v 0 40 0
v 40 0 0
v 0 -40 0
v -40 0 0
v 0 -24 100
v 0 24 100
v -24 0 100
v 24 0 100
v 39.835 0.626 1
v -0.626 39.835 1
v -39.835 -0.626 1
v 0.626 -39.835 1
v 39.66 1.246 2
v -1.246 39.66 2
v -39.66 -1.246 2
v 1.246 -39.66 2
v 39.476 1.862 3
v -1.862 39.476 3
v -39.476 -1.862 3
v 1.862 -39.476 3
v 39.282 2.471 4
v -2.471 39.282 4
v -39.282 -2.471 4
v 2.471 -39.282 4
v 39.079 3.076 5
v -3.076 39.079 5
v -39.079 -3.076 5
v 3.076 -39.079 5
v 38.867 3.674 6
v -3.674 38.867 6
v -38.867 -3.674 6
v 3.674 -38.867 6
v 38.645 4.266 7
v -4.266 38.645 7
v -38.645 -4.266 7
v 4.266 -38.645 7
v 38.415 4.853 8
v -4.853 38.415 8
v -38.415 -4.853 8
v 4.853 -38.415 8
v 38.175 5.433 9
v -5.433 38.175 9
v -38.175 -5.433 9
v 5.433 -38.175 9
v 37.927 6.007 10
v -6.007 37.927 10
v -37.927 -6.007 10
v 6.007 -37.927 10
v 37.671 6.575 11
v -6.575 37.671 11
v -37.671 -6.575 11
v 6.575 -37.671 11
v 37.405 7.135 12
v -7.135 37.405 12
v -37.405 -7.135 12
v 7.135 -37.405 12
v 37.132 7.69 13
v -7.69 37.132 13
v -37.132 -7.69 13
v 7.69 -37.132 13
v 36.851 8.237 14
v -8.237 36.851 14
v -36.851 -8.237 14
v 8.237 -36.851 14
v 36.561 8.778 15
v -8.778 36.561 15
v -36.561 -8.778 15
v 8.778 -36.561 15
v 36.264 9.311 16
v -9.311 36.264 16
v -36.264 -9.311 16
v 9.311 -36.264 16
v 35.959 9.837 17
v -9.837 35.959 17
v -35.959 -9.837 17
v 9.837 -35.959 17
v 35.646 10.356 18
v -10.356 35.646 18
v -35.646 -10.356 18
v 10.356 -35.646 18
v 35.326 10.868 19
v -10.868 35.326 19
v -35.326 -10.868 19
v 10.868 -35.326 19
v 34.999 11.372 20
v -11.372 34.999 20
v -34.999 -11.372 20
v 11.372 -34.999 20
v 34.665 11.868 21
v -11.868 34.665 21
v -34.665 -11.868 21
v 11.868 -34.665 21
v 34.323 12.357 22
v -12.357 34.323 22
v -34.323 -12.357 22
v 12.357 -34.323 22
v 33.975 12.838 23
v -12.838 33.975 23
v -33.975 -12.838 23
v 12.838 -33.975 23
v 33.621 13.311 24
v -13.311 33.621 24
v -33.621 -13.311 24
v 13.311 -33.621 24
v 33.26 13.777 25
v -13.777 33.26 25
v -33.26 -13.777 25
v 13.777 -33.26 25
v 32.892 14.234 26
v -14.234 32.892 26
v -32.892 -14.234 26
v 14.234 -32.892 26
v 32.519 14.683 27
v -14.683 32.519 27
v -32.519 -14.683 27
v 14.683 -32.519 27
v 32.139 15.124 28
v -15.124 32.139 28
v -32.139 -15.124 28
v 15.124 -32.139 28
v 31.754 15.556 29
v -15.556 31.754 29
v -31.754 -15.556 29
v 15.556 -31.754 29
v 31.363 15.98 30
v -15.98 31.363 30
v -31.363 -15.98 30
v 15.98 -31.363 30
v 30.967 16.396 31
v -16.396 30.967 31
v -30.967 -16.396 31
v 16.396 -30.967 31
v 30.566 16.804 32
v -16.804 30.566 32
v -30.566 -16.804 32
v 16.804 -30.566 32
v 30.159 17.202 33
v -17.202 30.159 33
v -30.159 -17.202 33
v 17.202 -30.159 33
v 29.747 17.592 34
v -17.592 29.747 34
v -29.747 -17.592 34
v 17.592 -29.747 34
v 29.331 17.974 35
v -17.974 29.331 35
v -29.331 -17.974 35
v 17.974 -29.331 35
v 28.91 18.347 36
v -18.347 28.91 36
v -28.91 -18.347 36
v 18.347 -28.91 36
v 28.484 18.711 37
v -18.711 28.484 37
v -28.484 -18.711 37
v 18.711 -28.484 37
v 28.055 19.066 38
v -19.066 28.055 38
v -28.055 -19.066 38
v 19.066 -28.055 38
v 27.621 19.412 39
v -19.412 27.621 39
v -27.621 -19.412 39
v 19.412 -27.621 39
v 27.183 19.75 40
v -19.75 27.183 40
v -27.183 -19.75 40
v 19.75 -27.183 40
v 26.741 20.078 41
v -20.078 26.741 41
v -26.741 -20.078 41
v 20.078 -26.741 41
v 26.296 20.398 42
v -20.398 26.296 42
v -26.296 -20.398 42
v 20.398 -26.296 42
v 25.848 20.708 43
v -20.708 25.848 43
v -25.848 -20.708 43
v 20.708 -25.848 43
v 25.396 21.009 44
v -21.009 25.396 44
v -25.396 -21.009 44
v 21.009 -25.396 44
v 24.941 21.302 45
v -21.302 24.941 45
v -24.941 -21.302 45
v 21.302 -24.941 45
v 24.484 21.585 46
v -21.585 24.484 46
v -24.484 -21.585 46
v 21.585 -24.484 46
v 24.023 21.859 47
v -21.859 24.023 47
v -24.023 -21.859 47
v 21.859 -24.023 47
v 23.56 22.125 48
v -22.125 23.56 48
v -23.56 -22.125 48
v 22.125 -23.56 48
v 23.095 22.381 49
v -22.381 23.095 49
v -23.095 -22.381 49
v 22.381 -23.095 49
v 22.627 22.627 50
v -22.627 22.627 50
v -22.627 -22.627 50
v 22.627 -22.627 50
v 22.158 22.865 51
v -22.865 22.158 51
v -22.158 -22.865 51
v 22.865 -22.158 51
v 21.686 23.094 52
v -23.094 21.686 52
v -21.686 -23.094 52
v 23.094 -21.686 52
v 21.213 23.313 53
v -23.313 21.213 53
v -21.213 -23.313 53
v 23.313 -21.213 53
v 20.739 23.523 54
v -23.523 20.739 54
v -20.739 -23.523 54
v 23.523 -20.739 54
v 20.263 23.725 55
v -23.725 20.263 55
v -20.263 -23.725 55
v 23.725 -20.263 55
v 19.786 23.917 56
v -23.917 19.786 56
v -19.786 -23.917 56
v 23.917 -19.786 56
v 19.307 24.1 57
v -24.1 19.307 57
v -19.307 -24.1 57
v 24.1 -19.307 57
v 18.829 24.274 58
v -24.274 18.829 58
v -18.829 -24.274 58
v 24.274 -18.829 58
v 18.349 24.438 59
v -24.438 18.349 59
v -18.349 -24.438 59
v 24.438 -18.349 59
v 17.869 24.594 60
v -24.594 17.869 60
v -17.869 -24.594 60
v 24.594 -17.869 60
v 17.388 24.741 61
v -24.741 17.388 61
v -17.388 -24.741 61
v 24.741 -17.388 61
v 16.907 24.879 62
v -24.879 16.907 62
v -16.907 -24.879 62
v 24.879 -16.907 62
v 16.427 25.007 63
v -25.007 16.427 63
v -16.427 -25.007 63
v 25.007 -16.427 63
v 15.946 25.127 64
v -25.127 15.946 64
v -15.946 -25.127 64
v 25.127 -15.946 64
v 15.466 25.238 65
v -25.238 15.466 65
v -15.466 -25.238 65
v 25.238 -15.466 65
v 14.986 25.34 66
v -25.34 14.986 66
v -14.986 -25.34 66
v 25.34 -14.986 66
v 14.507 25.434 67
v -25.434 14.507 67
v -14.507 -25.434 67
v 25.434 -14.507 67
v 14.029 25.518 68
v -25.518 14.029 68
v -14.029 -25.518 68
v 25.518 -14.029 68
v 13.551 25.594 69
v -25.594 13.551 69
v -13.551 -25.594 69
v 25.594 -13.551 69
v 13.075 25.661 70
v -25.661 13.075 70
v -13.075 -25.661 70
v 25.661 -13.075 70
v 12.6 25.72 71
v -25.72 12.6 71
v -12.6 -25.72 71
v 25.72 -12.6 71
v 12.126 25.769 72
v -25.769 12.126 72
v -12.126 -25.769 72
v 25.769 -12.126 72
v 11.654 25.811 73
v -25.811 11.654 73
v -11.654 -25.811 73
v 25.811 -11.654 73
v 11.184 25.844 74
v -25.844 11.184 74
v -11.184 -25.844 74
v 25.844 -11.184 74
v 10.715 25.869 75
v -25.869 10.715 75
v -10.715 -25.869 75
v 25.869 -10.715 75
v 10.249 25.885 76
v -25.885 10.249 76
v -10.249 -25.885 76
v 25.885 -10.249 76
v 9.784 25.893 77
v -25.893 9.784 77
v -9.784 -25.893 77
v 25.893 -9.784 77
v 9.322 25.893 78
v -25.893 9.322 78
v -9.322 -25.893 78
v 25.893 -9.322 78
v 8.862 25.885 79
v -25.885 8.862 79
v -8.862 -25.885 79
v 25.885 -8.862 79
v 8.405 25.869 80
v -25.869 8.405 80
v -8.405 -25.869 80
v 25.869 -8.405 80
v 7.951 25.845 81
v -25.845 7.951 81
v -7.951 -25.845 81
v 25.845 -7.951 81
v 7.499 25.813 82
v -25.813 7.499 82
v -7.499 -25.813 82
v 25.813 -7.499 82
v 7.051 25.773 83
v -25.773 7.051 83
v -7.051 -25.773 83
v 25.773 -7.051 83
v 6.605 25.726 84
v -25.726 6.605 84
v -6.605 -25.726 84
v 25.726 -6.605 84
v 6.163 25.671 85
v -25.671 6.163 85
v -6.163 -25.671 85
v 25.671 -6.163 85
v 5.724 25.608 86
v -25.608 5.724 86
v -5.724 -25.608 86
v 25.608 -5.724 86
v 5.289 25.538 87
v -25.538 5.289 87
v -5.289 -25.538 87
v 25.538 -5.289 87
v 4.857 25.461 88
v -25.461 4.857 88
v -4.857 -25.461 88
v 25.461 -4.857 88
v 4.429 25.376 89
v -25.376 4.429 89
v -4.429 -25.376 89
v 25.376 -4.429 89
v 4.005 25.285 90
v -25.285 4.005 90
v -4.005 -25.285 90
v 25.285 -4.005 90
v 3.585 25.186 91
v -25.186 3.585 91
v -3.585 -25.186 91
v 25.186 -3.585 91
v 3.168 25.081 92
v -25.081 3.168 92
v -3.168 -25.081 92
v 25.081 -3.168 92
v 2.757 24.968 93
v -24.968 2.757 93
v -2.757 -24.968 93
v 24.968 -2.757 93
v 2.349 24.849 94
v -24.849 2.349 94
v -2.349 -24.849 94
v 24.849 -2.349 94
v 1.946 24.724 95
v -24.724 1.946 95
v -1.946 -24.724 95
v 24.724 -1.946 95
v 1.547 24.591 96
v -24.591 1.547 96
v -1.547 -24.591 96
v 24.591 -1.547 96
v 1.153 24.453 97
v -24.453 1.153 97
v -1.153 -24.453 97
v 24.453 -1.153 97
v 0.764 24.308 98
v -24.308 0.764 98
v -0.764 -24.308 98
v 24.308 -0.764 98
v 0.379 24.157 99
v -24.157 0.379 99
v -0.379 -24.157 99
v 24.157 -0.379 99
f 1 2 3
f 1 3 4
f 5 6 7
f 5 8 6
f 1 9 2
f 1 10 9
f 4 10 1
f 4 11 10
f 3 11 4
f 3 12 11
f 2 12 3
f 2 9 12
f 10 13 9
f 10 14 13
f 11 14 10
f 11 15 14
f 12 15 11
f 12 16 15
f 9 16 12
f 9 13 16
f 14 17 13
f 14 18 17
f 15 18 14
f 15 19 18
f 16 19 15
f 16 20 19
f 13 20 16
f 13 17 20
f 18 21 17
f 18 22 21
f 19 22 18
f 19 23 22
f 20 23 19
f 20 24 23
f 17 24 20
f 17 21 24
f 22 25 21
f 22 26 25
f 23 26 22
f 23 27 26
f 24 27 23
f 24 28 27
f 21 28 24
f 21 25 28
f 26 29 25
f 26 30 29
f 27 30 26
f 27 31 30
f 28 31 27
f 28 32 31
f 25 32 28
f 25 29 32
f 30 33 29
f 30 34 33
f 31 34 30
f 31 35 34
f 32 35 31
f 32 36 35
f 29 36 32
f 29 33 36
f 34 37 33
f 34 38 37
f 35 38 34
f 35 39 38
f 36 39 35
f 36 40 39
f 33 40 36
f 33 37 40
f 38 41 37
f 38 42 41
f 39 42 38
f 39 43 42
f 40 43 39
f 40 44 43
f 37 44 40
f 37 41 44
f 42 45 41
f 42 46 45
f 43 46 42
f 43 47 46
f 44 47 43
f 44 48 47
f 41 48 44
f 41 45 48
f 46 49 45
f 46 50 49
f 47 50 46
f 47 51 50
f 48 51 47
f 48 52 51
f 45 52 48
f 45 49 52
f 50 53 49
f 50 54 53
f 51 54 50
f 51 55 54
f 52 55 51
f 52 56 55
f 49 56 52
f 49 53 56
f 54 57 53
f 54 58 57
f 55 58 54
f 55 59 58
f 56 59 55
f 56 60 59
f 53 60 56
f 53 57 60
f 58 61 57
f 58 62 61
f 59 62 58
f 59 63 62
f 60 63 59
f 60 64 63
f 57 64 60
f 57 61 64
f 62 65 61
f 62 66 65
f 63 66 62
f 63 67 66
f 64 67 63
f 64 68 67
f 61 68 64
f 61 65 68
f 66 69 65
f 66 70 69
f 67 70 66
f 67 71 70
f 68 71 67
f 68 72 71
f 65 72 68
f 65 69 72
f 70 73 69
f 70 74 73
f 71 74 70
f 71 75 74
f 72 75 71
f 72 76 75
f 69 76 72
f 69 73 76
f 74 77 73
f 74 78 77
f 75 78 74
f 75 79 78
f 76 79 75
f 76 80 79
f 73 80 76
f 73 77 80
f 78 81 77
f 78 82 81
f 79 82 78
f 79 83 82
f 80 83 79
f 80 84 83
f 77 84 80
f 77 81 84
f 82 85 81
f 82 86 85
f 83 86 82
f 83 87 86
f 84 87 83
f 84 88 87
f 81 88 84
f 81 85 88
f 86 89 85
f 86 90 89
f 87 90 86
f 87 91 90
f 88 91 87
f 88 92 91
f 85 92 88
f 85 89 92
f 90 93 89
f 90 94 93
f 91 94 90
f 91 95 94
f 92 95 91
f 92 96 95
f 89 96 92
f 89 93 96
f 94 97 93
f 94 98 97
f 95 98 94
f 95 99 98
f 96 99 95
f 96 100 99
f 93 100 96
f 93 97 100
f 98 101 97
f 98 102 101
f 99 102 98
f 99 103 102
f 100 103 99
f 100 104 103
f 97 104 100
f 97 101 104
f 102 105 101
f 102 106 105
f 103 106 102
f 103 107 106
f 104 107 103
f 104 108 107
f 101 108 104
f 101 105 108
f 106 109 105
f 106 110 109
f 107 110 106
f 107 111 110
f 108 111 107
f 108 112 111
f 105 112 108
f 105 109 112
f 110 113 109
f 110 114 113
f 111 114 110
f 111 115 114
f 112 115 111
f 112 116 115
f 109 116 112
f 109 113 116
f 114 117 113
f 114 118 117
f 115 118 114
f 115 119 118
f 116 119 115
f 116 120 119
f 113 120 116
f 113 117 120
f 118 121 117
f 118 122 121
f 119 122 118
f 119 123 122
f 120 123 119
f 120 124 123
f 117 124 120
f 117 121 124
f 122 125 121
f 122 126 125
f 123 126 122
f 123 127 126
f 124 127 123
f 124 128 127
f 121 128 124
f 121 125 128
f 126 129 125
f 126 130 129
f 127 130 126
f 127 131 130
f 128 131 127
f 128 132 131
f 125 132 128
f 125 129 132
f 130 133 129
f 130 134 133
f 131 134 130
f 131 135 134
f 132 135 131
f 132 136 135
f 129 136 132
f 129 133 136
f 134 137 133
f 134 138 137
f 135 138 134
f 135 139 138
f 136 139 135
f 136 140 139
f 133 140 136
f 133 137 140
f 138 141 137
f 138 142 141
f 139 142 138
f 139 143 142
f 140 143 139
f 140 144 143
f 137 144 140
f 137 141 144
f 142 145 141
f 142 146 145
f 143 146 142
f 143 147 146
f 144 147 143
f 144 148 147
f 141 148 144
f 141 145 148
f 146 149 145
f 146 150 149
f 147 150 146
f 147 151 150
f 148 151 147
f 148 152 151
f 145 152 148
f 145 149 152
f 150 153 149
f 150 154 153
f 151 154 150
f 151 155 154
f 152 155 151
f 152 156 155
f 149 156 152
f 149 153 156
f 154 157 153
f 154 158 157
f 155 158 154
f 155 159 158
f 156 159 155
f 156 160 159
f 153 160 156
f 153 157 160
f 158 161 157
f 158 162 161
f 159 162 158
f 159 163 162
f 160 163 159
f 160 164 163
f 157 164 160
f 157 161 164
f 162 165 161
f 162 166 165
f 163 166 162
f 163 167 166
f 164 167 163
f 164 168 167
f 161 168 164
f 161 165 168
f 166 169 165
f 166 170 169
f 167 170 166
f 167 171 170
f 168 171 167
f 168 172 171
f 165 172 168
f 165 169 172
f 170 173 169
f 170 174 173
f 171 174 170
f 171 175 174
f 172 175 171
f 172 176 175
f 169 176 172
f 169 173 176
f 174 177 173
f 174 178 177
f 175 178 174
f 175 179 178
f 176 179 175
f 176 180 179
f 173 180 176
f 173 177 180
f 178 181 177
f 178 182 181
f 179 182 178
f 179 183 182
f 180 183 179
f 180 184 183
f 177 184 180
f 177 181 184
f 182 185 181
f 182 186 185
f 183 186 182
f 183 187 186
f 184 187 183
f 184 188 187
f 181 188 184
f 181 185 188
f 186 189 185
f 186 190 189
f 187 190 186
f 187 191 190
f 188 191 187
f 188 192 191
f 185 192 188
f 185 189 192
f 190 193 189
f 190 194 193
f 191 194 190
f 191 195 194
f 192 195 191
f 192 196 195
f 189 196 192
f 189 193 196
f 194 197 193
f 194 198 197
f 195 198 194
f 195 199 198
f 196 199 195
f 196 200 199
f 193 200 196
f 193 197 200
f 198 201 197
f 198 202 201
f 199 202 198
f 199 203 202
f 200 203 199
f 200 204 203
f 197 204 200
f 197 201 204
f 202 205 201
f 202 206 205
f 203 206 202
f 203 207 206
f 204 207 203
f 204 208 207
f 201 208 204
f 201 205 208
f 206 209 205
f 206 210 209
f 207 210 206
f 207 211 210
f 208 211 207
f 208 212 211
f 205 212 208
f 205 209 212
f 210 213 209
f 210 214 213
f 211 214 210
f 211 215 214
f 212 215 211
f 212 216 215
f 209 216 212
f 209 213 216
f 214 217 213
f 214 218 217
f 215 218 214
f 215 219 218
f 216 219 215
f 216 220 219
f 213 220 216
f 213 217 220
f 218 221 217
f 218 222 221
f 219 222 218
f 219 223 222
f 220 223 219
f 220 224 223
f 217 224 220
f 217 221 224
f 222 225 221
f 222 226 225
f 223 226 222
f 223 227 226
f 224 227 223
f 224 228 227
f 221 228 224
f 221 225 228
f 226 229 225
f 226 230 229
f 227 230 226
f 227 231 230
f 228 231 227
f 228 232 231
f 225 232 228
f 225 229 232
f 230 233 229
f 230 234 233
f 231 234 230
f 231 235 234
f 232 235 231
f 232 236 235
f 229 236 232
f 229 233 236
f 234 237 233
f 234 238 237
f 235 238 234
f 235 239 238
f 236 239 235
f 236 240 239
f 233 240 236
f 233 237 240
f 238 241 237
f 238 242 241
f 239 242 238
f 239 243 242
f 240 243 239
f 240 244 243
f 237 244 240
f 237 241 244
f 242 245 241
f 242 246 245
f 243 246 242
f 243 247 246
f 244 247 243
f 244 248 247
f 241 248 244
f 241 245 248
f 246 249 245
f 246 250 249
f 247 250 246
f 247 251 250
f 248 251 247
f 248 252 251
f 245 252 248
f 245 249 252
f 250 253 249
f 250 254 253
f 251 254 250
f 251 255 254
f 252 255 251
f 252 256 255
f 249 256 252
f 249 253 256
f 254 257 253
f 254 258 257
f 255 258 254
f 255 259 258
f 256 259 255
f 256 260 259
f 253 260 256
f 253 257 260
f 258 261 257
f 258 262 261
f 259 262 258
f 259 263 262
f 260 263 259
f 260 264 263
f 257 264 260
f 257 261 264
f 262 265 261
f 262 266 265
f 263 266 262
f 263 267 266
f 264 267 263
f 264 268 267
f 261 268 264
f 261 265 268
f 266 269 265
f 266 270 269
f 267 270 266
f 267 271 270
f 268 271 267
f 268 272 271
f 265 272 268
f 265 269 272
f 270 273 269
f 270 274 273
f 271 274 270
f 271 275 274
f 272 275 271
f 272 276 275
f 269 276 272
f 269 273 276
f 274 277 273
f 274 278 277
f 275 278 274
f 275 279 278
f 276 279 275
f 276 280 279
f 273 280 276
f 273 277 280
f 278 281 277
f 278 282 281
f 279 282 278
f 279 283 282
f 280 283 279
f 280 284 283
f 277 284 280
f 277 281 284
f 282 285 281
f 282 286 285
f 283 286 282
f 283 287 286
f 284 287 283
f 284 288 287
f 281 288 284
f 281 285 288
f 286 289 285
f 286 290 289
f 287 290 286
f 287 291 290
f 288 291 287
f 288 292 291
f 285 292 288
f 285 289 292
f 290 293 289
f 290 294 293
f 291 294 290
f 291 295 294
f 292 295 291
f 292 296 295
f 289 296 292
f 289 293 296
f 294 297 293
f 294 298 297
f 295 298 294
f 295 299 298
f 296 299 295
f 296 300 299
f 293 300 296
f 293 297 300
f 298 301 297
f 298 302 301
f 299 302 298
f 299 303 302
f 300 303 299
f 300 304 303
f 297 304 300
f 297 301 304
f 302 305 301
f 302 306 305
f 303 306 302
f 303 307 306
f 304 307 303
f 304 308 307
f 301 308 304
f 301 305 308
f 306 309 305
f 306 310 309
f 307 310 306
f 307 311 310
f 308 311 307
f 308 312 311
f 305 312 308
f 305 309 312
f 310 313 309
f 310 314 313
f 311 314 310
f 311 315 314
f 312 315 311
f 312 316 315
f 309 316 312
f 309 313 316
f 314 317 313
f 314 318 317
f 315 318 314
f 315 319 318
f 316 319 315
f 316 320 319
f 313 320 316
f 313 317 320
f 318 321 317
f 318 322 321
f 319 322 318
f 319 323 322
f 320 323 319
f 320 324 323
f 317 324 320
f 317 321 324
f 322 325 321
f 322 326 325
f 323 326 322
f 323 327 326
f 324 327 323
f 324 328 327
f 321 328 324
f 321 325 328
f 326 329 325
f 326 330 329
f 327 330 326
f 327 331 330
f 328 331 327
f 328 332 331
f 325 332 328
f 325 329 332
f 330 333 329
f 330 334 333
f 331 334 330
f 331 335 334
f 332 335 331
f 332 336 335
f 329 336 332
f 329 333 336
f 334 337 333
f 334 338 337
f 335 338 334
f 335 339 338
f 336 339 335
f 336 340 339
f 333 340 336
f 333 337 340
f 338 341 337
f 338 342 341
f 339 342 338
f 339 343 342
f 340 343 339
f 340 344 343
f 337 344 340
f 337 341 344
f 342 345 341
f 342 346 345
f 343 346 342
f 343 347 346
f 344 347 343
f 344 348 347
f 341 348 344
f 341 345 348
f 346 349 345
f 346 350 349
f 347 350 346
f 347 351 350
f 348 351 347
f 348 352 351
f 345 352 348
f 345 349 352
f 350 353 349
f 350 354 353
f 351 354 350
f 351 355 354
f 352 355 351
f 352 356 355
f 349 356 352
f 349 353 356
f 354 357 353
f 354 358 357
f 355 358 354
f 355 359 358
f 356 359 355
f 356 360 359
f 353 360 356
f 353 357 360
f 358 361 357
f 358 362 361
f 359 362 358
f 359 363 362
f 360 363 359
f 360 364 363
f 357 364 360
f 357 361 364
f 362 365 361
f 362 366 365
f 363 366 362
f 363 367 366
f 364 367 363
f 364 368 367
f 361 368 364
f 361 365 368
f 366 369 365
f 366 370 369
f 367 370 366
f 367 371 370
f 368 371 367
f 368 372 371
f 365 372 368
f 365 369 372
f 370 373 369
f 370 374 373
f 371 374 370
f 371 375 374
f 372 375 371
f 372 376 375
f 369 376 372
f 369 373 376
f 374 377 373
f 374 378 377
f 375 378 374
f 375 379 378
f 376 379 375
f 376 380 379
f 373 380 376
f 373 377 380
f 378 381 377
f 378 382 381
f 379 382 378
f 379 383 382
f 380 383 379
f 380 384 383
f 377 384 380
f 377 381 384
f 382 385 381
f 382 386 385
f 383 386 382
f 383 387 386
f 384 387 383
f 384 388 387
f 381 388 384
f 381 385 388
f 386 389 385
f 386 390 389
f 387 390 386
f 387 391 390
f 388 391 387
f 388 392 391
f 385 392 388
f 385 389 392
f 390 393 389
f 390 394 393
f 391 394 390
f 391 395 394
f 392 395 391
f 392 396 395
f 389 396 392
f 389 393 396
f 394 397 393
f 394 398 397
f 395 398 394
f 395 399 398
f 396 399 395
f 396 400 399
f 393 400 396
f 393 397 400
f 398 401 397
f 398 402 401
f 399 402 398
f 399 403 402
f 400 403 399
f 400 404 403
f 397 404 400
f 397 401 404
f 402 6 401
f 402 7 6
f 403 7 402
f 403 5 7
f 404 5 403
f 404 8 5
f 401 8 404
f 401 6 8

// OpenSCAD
num_corners=4;
height=100;
base_radius=40;
angle_twist=-90;
top_scale=.6;
linear_extrude(height = height, center = false, convexity = 50, twist = angle_twist,scale=top_scale,$fn=num_corners,slices=height)
 circle(base_radius);
